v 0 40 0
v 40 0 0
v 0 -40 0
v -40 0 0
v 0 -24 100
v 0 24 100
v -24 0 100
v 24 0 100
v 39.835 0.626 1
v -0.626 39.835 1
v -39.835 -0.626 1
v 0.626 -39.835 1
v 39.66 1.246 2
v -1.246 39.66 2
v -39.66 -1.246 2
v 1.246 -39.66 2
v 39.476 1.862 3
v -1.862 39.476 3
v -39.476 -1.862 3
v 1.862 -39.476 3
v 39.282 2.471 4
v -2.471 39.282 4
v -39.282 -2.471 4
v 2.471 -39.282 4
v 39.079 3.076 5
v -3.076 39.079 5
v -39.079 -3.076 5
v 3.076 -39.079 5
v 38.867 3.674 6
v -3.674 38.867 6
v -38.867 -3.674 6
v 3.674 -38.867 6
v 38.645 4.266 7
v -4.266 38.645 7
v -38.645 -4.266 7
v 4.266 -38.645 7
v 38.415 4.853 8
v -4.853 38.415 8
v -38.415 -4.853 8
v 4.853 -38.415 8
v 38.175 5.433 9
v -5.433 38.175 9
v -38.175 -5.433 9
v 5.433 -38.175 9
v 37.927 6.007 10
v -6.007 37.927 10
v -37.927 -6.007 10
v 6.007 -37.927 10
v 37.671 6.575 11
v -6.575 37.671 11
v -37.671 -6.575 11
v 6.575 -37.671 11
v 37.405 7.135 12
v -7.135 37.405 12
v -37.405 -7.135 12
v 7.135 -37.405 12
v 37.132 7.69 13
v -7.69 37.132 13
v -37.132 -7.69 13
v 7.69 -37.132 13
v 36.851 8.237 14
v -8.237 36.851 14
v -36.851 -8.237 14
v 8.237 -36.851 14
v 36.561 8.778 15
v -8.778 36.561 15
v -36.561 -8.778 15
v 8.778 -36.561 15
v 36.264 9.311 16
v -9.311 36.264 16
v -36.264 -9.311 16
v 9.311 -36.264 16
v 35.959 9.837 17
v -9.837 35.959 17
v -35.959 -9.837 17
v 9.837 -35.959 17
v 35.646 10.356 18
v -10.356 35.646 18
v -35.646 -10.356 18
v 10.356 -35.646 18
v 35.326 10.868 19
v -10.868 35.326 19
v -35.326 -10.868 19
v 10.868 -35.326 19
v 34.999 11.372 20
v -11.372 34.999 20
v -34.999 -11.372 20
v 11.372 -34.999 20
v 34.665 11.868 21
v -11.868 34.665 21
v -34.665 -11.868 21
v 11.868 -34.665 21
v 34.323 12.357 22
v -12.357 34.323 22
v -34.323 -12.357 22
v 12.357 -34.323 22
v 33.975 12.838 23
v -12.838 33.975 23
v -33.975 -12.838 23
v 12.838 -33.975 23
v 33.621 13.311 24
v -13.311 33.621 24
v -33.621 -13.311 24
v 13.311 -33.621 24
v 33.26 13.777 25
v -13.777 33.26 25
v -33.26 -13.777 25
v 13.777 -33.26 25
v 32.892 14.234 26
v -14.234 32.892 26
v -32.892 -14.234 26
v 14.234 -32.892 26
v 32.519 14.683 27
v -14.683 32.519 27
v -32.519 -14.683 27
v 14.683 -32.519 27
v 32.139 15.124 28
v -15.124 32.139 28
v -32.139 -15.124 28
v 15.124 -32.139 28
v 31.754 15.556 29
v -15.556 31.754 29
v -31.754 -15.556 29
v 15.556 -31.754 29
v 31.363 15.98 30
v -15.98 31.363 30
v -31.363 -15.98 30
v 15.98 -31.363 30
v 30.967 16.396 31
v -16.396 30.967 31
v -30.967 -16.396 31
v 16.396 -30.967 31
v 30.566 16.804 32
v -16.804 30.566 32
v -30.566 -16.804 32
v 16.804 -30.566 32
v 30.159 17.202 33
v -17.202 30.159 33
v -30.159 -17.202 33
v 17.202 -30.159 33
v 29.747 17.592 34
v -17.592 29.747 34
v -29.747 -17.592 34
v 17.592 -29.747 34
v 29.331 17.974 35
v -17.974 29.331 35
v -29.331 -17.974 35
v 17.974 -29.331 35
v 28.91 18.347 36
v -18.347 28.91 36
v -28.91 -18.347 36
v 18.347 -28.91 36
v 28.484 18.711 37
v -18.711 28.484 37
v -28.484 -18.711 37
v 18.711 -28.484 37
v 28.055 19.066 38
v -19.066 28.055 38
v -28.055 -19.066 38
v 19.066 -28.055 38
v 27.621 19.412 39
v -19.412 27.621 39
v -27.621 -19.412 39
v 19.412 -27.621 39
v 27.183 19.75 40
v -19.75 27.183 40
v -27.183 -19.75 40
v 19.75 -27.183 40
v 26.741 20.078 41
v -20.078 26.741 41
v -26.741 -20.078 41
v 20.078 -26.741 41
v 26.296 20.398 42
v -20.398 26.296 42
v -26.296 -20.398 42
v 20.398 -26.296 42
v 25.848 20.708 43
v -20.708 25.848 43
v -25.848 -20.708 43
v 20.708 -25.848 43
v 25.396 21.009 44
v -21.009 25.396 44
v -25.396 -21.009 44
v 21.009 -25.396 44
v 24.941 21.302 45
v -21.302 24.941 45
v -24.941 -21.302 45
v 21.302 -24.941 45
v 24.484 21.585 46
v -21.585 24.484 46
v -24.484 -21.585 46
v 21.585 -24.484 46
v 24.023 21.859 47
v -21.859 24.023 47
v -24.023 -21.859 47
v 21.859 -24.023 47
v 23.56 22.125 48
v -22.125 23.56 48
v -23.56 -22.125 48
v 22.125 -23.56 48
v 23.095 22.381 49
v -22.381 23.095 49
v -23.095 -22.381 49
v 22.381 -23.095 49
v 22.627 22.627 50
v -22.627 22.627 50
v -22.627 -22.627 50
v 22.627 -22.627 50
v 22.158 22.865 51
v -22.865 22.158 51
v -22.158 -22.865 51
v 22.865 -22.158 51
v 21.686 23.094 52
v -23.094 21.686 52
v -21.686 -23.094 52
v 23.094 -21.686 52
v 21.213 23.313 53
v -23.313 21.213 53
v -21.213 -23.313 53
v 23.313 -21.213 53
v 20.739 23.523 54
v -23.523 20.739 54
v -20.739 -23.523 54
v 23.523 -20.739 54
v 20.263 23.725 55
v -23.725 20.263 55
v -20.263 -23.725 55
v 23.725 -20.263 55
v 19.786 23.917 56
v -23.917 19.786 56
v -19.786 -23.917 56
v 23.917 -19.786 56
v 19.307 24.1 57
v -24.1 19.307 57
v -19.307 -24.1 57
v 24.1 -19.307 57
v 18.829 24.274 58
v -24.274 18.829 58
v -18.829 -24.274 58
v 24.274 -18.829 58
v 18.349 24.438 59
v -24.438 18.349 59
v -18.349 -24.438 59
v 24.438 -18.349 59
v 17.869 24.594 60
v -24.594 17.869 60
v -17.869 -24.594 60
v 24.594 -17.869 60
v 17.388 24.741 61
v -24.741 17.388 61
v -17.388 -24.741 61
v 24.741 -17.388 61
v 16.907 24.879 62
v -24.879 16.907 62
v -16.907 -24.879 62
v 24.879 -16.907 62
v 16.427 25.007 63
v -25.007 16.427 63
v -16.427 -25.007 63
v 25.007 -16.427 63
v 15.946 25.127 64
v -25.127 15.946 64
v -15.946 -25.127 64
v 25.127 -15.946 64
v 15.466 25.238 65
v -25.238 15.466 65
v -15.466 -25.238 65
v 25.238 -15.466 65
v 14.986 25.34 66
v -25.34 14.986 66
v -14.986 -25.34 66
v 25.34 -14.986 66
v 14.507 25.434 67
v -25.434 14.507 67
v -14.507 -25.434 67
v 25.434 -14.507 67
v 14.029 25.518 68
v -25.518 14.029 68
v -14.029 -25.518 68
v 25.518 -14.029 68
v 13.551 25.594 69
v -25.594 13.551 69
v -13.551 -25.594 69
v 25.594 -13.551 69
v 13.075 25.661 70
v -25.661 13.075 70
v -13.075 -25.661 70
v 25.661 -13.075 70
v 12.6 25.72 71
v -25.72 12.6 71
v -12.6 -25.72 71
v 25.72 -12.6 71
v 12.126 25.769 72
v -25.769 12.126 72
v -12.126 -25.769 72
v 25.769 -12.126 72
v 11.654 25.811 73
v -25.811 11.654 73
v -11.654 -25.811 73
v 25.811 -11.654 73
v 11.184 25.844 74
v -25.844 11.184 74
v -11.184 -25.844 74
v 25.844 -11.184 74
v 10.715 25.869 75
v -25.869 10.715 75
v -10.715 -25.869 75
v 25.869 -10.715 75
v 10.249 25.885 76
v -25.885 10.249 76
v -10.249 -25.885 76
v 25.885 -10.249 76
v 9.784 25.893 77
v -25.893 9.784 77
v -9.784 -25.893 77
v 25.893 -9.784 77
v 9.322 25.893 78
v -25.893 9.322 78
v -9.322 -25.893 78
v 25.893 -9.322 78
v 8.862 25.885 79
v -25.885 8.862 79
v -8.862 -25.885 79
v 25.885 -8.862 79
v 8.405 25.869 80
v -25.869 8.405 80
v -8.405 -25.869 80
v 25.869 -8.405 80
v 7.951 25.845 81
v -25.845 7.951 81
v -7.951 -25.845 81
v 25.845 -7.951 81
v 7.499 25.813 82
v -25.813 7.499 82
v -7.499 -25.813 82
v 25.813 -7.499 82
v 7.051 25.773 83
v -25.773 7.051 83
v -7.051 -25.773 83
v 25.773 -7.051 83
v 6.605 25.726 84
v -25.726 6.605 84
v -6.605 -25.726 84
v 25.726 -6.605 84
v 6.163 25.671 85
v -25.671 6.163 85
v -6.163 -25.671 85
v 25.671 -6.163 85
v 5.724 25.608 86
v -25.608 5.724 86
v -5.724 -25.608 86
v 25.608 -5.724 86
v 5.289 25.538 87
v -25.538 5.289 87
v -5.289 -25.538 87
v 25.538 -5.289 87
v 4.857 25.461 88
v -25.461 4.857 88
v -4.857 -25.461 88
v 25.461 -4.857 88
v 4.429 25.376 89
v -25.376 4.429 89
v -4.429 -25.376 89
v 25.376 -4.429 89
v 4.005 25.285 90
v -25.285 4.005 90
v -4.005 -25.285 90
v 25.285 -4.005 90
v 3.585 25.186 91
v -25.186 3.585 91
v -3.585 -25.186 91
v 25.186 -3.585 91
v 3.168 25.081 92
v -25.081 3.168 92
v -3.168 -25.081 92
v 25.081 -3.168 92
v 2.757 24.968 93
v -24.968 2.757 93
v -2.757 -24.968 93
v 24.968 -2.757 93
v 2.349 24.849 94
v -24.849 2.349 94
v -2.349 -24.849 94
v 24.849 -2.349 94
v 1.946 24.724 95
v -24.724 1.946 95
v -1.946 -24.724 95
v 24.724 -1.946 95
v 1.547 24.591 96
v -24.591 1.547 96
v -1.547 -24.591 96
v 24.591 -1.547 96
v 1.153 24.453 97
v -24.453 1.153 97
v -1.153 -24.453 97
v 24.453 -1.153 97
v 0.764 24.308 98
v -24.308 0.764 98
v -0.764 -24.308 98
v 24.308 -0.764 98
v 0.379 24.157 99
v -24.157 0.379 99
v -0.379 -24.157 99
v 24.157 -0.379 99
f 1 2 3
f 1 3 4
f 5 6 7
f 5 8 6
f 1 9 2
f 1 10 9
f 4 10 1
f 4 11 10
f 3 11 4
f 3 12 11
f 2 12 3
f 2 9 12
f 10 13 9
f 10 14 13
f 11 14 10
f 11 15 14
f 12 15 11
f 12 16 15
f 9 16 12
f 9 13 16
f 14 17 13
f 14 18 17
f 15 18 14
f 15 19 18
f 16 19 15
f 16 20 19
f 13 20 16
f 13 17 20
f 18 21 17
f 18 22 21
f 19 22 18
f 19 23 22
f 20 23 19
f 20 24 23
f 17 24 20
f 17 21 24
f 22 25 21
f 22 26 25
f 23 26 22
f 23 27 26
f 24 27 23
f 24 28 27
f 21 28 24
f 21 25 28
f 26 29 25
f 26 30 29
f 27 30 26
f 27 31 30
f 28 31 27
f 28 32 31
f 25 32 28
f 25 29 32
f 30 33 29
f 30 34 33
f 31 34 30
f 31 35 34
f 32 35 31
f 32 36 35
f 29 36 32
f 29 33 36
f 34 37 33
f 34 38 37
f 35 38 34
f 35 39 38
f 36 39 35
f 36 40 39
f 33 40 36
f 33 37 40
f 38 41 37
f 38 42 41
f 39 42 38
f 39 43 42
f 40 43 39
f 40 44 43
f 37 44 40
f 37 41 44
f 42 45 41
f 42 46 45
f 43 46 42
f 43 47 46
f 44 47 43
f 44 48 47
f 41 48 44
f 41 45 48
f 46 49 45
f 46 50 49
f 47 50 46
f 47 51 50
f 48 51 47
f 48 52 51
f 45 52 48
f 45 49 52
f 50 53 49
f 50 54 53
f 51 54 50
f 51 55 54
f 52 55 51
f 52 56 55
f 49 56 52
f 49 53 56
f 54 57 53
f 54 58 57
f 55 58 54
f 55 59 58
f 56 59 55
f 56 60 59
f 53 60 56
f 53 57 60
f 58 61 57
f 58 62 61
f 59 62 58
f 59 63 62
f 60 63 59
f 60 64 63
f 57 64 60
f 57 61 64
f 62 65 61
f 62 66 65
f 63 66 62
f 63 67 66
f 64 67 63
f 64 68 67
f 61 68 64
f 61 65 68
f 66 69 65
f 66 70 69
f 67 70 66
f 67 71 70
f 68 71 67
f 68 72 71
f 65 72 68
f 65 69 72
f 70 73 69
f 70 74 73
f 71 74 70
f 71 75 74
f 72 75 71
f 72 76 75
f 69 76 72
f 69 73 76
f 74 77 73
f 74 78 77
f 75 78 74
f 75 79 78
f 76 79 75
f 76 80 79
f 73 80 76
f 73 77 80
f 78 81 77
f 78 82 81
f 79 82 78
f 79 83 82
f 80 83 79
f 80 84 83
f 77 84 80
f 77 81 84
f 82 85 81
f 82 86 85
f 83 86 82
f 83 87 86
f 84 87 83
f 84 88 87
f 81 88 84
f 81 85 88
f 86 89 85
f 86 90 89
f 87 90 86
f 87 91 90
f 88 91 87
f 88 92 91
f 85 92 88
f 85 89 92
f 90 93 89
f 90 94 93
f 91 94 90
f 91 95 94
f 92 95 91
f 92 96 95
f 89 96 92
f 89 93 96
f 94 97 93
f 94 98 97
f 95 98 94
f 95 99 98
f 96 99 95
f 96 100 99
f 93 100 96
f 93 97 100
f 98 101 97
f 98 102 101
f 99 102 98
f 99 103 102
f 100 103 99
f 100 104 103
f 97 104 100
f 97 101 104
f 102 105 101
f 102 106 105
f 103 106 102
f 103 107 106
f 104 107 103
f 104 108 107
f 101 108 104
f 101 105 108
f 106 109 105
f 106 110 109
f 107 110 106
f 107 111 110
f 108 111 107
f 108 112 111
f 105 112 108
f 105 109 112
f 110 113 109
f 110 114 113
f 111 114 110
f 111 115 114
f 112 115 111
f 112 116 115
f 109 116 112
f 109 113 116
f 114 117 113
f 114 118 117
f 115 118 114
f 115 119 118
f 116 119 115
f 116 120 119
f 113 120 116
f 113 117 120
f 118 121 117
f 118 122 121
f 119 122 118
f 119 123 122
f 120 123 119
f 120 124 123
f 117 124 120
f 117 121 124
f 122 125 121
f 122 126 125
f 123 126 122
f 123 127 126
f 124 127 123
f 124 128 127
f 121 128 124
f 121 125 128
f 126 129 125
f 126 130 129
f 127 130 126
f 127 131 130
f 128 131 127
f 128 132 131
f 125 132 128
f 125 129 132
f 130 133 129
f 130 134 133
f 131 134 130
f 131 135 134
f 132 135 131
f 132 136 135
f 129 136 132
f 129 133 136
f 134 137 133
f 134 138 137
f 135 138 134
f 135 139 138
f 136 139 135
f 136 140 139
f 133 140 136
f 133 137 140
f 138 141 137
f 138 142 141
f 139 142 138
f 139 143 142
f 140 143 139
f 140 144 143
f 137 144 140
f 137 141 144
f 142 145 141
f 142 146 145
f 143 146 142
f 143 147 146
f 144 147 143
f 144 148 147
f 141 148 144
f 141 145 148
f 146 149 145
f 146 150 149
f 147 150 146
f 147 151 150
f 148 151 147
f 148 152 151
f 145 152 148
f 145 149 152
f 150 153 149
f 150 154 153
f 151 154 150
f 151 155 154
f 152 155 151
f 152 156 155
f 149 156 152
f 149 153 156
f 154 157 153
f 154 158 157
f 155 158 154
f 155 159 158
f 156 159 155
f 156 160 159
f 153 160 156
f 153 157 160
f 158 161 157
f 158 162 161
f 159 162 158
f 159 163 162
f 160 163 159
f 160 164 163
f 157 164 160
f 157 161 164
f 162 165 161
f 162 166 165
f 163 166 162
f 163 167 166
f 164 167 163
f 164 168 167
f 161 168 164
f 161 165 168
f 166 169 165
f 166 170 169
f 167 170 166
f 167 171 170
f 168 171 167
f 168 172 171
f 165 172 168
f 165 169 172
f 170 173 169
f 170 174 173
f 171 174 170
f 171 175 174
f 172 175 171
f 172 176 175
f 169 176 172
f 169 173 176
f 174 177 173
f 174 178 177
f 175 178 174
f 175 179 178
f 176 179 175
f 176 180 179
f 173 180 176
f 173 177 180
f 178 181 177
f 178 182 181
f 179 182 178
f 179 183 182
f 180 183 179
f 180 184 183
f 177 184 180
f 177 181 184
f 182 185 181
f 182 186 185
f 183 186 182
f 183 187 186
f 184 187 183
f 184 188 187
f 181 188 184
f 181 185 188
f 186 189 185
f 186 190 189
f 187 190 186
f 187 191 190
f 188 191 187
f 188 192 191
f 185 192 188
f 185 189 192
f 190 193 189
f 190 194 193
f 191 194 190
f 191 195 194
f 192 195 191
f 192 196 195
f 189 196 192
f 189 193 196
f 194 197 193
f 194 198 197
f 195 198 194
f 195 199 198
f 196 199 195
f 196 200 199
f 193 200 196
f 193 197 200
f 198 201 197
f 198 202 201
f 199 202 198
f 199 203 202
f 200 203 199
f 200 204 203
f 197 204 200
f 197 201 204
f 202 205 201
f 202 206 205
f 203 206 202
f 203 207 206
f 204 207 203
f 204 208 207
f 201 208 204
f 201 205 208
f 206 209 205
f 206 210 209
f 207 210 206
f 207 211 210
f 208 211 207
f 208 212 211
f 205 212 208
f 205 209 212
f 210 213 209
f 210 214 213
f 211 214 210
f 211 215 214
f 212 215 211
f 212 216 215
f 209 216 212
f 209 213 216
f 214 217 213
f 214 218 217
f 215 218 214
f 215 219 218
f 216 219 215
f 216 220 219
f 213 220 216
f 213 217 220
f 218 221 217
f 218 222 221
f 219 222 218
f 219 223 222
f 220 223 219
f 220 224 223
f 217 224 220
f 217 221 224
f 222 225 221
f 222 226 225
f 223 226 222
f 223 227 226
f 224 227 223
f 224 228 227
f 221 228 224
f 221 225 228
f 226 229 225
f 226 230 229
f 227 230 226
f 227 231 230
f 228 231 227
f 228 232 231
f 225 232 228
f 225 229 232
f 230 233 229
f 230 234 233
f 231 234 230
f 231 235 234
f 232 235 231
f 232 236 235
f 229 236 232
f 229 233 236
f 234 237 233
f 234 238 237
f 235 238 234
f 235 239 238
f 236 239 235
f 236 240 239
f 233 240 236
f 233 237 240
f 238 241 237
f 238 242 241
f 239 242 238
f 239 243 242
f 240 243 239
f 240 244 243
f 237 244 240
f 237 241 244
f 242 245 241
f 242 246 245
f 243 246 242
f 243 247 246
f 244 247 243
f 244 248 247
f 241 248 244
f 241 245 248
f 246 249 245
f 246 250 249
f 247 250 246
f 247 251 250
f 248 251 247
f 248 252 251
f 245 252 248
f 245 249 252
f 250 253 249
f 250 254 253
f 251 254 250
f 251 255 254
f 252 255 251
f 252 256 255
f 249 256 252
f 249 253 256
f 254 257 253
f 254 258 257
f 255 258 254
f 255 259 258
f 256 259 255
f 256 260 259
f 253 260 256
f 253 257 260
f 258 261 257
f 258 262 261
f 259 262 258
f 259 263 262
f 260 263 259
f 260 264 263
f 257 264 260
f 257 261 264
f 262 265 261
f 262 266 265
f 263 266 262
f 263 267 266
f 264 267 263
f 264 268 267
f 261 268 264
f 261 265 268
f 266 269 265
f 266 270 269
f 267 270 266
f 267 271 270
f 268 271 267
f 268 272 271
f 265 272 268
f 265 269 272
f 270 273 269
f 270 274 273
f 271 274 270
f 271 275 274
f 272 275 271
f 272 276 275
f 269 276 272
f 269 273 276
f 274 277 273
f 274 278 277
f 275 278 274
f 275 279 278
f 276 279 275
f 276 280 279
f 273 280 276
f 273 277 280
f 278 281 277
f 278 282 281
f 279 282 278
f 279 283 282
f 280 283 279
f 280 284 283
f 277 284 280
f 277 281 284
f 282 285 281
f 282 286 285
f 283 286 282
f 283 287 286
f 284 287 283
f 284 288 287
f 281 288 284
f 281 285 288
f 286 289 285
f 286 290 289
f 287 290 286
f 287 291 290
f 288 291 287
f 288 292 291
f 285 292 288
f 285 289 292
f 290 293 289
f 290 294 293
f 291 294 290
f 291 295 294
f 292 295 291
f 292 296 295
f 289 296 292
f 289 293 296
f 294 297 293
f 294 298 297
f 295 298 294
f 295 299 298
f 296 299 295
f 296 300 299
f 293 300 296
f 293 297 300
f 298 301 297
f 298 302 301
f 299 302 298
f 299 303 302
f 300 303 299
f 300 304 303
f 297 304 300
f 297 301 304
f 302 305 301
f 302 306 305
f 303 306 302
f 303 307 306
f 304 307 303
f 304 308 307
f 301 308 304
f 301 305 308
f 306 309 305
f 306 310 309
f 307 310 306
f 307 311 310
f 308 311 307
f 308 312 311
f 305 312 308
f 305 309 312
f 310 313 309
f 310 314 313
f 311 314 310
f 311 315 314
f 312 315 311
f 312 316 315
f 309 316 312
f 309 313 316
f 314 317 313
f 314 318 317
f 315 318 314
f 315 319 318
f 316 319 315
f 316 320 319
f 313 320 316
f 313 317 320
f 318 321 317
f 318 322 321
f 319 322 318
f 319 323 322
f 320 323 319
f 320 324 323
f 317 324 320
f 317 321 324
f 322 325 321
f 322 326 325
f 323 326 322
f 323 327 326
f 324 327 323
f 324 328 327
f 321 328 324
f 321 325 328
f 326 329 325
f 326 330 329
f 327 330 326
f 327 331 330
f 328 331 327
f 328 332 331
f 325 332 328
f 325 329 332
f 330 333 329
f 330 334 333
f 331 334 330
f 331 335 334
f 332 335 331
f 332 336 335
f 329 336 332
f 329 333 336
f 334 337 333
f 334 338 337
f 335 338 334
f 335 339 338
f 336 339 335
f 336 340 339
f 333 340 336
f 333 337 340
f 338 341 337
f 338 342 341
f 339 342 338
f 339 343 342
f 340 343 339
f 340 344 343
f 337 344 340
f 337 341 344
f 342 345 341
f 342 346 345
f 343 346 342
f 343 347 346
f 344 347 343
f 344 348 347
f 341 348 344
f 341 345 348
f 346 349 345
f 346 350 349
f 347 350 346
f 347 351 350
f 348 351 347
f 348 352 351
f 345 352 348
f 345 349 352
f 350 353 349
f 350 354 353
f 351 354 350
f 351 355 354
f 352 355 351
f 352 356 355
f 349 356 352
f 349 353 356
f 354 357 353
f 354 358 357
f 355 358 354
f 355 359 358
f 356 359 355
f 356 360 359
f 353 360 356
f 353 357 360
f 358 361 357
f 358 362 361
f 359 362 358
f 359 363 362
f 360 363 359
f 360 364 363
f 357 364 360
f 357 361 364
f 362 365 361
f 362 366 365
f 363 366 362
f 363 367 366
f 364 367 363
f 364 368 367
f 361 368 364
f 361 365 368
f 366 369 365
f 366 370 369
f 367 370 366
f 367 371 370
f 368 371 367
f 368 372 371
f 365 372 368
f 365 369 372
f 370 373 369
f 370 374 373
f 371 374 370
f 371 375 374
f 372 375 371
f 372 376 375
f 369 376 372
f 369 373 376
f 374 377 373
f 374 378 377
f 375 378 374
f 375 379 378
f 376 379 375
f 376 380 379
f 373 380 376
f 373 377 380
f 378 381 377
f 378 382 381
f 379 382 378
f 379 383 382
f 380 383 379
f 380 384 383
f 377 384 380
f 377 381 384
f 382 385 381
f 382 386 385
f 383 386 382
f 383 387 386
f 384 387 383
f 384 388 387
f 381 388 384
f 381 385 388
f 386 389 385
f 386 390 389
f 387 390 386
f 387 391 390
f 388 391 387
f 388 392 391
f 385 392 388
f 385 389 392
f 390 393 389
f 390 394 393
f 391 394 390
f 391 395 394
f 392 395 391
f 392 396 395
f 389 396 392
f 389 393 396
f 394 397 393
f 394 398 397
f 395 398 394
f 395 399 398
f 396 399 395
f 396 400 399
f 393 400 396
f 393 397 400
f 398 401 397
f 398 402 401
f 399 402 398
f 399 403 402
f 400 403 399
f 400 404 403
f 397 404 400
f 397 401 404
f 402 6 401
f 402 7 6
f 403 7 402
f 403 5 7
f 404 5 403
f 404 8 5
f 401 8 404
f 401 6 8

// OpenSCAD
num_corners=4;
height=100;
base_radius=40;
angle_twist=-90;
top_scale=.6;
linear_extrude(height = height, center = false, convexity = 50, twist = angle_twist,scale=top_scale,$fn=num_corners,slices=height)
 circle(base_radius);
